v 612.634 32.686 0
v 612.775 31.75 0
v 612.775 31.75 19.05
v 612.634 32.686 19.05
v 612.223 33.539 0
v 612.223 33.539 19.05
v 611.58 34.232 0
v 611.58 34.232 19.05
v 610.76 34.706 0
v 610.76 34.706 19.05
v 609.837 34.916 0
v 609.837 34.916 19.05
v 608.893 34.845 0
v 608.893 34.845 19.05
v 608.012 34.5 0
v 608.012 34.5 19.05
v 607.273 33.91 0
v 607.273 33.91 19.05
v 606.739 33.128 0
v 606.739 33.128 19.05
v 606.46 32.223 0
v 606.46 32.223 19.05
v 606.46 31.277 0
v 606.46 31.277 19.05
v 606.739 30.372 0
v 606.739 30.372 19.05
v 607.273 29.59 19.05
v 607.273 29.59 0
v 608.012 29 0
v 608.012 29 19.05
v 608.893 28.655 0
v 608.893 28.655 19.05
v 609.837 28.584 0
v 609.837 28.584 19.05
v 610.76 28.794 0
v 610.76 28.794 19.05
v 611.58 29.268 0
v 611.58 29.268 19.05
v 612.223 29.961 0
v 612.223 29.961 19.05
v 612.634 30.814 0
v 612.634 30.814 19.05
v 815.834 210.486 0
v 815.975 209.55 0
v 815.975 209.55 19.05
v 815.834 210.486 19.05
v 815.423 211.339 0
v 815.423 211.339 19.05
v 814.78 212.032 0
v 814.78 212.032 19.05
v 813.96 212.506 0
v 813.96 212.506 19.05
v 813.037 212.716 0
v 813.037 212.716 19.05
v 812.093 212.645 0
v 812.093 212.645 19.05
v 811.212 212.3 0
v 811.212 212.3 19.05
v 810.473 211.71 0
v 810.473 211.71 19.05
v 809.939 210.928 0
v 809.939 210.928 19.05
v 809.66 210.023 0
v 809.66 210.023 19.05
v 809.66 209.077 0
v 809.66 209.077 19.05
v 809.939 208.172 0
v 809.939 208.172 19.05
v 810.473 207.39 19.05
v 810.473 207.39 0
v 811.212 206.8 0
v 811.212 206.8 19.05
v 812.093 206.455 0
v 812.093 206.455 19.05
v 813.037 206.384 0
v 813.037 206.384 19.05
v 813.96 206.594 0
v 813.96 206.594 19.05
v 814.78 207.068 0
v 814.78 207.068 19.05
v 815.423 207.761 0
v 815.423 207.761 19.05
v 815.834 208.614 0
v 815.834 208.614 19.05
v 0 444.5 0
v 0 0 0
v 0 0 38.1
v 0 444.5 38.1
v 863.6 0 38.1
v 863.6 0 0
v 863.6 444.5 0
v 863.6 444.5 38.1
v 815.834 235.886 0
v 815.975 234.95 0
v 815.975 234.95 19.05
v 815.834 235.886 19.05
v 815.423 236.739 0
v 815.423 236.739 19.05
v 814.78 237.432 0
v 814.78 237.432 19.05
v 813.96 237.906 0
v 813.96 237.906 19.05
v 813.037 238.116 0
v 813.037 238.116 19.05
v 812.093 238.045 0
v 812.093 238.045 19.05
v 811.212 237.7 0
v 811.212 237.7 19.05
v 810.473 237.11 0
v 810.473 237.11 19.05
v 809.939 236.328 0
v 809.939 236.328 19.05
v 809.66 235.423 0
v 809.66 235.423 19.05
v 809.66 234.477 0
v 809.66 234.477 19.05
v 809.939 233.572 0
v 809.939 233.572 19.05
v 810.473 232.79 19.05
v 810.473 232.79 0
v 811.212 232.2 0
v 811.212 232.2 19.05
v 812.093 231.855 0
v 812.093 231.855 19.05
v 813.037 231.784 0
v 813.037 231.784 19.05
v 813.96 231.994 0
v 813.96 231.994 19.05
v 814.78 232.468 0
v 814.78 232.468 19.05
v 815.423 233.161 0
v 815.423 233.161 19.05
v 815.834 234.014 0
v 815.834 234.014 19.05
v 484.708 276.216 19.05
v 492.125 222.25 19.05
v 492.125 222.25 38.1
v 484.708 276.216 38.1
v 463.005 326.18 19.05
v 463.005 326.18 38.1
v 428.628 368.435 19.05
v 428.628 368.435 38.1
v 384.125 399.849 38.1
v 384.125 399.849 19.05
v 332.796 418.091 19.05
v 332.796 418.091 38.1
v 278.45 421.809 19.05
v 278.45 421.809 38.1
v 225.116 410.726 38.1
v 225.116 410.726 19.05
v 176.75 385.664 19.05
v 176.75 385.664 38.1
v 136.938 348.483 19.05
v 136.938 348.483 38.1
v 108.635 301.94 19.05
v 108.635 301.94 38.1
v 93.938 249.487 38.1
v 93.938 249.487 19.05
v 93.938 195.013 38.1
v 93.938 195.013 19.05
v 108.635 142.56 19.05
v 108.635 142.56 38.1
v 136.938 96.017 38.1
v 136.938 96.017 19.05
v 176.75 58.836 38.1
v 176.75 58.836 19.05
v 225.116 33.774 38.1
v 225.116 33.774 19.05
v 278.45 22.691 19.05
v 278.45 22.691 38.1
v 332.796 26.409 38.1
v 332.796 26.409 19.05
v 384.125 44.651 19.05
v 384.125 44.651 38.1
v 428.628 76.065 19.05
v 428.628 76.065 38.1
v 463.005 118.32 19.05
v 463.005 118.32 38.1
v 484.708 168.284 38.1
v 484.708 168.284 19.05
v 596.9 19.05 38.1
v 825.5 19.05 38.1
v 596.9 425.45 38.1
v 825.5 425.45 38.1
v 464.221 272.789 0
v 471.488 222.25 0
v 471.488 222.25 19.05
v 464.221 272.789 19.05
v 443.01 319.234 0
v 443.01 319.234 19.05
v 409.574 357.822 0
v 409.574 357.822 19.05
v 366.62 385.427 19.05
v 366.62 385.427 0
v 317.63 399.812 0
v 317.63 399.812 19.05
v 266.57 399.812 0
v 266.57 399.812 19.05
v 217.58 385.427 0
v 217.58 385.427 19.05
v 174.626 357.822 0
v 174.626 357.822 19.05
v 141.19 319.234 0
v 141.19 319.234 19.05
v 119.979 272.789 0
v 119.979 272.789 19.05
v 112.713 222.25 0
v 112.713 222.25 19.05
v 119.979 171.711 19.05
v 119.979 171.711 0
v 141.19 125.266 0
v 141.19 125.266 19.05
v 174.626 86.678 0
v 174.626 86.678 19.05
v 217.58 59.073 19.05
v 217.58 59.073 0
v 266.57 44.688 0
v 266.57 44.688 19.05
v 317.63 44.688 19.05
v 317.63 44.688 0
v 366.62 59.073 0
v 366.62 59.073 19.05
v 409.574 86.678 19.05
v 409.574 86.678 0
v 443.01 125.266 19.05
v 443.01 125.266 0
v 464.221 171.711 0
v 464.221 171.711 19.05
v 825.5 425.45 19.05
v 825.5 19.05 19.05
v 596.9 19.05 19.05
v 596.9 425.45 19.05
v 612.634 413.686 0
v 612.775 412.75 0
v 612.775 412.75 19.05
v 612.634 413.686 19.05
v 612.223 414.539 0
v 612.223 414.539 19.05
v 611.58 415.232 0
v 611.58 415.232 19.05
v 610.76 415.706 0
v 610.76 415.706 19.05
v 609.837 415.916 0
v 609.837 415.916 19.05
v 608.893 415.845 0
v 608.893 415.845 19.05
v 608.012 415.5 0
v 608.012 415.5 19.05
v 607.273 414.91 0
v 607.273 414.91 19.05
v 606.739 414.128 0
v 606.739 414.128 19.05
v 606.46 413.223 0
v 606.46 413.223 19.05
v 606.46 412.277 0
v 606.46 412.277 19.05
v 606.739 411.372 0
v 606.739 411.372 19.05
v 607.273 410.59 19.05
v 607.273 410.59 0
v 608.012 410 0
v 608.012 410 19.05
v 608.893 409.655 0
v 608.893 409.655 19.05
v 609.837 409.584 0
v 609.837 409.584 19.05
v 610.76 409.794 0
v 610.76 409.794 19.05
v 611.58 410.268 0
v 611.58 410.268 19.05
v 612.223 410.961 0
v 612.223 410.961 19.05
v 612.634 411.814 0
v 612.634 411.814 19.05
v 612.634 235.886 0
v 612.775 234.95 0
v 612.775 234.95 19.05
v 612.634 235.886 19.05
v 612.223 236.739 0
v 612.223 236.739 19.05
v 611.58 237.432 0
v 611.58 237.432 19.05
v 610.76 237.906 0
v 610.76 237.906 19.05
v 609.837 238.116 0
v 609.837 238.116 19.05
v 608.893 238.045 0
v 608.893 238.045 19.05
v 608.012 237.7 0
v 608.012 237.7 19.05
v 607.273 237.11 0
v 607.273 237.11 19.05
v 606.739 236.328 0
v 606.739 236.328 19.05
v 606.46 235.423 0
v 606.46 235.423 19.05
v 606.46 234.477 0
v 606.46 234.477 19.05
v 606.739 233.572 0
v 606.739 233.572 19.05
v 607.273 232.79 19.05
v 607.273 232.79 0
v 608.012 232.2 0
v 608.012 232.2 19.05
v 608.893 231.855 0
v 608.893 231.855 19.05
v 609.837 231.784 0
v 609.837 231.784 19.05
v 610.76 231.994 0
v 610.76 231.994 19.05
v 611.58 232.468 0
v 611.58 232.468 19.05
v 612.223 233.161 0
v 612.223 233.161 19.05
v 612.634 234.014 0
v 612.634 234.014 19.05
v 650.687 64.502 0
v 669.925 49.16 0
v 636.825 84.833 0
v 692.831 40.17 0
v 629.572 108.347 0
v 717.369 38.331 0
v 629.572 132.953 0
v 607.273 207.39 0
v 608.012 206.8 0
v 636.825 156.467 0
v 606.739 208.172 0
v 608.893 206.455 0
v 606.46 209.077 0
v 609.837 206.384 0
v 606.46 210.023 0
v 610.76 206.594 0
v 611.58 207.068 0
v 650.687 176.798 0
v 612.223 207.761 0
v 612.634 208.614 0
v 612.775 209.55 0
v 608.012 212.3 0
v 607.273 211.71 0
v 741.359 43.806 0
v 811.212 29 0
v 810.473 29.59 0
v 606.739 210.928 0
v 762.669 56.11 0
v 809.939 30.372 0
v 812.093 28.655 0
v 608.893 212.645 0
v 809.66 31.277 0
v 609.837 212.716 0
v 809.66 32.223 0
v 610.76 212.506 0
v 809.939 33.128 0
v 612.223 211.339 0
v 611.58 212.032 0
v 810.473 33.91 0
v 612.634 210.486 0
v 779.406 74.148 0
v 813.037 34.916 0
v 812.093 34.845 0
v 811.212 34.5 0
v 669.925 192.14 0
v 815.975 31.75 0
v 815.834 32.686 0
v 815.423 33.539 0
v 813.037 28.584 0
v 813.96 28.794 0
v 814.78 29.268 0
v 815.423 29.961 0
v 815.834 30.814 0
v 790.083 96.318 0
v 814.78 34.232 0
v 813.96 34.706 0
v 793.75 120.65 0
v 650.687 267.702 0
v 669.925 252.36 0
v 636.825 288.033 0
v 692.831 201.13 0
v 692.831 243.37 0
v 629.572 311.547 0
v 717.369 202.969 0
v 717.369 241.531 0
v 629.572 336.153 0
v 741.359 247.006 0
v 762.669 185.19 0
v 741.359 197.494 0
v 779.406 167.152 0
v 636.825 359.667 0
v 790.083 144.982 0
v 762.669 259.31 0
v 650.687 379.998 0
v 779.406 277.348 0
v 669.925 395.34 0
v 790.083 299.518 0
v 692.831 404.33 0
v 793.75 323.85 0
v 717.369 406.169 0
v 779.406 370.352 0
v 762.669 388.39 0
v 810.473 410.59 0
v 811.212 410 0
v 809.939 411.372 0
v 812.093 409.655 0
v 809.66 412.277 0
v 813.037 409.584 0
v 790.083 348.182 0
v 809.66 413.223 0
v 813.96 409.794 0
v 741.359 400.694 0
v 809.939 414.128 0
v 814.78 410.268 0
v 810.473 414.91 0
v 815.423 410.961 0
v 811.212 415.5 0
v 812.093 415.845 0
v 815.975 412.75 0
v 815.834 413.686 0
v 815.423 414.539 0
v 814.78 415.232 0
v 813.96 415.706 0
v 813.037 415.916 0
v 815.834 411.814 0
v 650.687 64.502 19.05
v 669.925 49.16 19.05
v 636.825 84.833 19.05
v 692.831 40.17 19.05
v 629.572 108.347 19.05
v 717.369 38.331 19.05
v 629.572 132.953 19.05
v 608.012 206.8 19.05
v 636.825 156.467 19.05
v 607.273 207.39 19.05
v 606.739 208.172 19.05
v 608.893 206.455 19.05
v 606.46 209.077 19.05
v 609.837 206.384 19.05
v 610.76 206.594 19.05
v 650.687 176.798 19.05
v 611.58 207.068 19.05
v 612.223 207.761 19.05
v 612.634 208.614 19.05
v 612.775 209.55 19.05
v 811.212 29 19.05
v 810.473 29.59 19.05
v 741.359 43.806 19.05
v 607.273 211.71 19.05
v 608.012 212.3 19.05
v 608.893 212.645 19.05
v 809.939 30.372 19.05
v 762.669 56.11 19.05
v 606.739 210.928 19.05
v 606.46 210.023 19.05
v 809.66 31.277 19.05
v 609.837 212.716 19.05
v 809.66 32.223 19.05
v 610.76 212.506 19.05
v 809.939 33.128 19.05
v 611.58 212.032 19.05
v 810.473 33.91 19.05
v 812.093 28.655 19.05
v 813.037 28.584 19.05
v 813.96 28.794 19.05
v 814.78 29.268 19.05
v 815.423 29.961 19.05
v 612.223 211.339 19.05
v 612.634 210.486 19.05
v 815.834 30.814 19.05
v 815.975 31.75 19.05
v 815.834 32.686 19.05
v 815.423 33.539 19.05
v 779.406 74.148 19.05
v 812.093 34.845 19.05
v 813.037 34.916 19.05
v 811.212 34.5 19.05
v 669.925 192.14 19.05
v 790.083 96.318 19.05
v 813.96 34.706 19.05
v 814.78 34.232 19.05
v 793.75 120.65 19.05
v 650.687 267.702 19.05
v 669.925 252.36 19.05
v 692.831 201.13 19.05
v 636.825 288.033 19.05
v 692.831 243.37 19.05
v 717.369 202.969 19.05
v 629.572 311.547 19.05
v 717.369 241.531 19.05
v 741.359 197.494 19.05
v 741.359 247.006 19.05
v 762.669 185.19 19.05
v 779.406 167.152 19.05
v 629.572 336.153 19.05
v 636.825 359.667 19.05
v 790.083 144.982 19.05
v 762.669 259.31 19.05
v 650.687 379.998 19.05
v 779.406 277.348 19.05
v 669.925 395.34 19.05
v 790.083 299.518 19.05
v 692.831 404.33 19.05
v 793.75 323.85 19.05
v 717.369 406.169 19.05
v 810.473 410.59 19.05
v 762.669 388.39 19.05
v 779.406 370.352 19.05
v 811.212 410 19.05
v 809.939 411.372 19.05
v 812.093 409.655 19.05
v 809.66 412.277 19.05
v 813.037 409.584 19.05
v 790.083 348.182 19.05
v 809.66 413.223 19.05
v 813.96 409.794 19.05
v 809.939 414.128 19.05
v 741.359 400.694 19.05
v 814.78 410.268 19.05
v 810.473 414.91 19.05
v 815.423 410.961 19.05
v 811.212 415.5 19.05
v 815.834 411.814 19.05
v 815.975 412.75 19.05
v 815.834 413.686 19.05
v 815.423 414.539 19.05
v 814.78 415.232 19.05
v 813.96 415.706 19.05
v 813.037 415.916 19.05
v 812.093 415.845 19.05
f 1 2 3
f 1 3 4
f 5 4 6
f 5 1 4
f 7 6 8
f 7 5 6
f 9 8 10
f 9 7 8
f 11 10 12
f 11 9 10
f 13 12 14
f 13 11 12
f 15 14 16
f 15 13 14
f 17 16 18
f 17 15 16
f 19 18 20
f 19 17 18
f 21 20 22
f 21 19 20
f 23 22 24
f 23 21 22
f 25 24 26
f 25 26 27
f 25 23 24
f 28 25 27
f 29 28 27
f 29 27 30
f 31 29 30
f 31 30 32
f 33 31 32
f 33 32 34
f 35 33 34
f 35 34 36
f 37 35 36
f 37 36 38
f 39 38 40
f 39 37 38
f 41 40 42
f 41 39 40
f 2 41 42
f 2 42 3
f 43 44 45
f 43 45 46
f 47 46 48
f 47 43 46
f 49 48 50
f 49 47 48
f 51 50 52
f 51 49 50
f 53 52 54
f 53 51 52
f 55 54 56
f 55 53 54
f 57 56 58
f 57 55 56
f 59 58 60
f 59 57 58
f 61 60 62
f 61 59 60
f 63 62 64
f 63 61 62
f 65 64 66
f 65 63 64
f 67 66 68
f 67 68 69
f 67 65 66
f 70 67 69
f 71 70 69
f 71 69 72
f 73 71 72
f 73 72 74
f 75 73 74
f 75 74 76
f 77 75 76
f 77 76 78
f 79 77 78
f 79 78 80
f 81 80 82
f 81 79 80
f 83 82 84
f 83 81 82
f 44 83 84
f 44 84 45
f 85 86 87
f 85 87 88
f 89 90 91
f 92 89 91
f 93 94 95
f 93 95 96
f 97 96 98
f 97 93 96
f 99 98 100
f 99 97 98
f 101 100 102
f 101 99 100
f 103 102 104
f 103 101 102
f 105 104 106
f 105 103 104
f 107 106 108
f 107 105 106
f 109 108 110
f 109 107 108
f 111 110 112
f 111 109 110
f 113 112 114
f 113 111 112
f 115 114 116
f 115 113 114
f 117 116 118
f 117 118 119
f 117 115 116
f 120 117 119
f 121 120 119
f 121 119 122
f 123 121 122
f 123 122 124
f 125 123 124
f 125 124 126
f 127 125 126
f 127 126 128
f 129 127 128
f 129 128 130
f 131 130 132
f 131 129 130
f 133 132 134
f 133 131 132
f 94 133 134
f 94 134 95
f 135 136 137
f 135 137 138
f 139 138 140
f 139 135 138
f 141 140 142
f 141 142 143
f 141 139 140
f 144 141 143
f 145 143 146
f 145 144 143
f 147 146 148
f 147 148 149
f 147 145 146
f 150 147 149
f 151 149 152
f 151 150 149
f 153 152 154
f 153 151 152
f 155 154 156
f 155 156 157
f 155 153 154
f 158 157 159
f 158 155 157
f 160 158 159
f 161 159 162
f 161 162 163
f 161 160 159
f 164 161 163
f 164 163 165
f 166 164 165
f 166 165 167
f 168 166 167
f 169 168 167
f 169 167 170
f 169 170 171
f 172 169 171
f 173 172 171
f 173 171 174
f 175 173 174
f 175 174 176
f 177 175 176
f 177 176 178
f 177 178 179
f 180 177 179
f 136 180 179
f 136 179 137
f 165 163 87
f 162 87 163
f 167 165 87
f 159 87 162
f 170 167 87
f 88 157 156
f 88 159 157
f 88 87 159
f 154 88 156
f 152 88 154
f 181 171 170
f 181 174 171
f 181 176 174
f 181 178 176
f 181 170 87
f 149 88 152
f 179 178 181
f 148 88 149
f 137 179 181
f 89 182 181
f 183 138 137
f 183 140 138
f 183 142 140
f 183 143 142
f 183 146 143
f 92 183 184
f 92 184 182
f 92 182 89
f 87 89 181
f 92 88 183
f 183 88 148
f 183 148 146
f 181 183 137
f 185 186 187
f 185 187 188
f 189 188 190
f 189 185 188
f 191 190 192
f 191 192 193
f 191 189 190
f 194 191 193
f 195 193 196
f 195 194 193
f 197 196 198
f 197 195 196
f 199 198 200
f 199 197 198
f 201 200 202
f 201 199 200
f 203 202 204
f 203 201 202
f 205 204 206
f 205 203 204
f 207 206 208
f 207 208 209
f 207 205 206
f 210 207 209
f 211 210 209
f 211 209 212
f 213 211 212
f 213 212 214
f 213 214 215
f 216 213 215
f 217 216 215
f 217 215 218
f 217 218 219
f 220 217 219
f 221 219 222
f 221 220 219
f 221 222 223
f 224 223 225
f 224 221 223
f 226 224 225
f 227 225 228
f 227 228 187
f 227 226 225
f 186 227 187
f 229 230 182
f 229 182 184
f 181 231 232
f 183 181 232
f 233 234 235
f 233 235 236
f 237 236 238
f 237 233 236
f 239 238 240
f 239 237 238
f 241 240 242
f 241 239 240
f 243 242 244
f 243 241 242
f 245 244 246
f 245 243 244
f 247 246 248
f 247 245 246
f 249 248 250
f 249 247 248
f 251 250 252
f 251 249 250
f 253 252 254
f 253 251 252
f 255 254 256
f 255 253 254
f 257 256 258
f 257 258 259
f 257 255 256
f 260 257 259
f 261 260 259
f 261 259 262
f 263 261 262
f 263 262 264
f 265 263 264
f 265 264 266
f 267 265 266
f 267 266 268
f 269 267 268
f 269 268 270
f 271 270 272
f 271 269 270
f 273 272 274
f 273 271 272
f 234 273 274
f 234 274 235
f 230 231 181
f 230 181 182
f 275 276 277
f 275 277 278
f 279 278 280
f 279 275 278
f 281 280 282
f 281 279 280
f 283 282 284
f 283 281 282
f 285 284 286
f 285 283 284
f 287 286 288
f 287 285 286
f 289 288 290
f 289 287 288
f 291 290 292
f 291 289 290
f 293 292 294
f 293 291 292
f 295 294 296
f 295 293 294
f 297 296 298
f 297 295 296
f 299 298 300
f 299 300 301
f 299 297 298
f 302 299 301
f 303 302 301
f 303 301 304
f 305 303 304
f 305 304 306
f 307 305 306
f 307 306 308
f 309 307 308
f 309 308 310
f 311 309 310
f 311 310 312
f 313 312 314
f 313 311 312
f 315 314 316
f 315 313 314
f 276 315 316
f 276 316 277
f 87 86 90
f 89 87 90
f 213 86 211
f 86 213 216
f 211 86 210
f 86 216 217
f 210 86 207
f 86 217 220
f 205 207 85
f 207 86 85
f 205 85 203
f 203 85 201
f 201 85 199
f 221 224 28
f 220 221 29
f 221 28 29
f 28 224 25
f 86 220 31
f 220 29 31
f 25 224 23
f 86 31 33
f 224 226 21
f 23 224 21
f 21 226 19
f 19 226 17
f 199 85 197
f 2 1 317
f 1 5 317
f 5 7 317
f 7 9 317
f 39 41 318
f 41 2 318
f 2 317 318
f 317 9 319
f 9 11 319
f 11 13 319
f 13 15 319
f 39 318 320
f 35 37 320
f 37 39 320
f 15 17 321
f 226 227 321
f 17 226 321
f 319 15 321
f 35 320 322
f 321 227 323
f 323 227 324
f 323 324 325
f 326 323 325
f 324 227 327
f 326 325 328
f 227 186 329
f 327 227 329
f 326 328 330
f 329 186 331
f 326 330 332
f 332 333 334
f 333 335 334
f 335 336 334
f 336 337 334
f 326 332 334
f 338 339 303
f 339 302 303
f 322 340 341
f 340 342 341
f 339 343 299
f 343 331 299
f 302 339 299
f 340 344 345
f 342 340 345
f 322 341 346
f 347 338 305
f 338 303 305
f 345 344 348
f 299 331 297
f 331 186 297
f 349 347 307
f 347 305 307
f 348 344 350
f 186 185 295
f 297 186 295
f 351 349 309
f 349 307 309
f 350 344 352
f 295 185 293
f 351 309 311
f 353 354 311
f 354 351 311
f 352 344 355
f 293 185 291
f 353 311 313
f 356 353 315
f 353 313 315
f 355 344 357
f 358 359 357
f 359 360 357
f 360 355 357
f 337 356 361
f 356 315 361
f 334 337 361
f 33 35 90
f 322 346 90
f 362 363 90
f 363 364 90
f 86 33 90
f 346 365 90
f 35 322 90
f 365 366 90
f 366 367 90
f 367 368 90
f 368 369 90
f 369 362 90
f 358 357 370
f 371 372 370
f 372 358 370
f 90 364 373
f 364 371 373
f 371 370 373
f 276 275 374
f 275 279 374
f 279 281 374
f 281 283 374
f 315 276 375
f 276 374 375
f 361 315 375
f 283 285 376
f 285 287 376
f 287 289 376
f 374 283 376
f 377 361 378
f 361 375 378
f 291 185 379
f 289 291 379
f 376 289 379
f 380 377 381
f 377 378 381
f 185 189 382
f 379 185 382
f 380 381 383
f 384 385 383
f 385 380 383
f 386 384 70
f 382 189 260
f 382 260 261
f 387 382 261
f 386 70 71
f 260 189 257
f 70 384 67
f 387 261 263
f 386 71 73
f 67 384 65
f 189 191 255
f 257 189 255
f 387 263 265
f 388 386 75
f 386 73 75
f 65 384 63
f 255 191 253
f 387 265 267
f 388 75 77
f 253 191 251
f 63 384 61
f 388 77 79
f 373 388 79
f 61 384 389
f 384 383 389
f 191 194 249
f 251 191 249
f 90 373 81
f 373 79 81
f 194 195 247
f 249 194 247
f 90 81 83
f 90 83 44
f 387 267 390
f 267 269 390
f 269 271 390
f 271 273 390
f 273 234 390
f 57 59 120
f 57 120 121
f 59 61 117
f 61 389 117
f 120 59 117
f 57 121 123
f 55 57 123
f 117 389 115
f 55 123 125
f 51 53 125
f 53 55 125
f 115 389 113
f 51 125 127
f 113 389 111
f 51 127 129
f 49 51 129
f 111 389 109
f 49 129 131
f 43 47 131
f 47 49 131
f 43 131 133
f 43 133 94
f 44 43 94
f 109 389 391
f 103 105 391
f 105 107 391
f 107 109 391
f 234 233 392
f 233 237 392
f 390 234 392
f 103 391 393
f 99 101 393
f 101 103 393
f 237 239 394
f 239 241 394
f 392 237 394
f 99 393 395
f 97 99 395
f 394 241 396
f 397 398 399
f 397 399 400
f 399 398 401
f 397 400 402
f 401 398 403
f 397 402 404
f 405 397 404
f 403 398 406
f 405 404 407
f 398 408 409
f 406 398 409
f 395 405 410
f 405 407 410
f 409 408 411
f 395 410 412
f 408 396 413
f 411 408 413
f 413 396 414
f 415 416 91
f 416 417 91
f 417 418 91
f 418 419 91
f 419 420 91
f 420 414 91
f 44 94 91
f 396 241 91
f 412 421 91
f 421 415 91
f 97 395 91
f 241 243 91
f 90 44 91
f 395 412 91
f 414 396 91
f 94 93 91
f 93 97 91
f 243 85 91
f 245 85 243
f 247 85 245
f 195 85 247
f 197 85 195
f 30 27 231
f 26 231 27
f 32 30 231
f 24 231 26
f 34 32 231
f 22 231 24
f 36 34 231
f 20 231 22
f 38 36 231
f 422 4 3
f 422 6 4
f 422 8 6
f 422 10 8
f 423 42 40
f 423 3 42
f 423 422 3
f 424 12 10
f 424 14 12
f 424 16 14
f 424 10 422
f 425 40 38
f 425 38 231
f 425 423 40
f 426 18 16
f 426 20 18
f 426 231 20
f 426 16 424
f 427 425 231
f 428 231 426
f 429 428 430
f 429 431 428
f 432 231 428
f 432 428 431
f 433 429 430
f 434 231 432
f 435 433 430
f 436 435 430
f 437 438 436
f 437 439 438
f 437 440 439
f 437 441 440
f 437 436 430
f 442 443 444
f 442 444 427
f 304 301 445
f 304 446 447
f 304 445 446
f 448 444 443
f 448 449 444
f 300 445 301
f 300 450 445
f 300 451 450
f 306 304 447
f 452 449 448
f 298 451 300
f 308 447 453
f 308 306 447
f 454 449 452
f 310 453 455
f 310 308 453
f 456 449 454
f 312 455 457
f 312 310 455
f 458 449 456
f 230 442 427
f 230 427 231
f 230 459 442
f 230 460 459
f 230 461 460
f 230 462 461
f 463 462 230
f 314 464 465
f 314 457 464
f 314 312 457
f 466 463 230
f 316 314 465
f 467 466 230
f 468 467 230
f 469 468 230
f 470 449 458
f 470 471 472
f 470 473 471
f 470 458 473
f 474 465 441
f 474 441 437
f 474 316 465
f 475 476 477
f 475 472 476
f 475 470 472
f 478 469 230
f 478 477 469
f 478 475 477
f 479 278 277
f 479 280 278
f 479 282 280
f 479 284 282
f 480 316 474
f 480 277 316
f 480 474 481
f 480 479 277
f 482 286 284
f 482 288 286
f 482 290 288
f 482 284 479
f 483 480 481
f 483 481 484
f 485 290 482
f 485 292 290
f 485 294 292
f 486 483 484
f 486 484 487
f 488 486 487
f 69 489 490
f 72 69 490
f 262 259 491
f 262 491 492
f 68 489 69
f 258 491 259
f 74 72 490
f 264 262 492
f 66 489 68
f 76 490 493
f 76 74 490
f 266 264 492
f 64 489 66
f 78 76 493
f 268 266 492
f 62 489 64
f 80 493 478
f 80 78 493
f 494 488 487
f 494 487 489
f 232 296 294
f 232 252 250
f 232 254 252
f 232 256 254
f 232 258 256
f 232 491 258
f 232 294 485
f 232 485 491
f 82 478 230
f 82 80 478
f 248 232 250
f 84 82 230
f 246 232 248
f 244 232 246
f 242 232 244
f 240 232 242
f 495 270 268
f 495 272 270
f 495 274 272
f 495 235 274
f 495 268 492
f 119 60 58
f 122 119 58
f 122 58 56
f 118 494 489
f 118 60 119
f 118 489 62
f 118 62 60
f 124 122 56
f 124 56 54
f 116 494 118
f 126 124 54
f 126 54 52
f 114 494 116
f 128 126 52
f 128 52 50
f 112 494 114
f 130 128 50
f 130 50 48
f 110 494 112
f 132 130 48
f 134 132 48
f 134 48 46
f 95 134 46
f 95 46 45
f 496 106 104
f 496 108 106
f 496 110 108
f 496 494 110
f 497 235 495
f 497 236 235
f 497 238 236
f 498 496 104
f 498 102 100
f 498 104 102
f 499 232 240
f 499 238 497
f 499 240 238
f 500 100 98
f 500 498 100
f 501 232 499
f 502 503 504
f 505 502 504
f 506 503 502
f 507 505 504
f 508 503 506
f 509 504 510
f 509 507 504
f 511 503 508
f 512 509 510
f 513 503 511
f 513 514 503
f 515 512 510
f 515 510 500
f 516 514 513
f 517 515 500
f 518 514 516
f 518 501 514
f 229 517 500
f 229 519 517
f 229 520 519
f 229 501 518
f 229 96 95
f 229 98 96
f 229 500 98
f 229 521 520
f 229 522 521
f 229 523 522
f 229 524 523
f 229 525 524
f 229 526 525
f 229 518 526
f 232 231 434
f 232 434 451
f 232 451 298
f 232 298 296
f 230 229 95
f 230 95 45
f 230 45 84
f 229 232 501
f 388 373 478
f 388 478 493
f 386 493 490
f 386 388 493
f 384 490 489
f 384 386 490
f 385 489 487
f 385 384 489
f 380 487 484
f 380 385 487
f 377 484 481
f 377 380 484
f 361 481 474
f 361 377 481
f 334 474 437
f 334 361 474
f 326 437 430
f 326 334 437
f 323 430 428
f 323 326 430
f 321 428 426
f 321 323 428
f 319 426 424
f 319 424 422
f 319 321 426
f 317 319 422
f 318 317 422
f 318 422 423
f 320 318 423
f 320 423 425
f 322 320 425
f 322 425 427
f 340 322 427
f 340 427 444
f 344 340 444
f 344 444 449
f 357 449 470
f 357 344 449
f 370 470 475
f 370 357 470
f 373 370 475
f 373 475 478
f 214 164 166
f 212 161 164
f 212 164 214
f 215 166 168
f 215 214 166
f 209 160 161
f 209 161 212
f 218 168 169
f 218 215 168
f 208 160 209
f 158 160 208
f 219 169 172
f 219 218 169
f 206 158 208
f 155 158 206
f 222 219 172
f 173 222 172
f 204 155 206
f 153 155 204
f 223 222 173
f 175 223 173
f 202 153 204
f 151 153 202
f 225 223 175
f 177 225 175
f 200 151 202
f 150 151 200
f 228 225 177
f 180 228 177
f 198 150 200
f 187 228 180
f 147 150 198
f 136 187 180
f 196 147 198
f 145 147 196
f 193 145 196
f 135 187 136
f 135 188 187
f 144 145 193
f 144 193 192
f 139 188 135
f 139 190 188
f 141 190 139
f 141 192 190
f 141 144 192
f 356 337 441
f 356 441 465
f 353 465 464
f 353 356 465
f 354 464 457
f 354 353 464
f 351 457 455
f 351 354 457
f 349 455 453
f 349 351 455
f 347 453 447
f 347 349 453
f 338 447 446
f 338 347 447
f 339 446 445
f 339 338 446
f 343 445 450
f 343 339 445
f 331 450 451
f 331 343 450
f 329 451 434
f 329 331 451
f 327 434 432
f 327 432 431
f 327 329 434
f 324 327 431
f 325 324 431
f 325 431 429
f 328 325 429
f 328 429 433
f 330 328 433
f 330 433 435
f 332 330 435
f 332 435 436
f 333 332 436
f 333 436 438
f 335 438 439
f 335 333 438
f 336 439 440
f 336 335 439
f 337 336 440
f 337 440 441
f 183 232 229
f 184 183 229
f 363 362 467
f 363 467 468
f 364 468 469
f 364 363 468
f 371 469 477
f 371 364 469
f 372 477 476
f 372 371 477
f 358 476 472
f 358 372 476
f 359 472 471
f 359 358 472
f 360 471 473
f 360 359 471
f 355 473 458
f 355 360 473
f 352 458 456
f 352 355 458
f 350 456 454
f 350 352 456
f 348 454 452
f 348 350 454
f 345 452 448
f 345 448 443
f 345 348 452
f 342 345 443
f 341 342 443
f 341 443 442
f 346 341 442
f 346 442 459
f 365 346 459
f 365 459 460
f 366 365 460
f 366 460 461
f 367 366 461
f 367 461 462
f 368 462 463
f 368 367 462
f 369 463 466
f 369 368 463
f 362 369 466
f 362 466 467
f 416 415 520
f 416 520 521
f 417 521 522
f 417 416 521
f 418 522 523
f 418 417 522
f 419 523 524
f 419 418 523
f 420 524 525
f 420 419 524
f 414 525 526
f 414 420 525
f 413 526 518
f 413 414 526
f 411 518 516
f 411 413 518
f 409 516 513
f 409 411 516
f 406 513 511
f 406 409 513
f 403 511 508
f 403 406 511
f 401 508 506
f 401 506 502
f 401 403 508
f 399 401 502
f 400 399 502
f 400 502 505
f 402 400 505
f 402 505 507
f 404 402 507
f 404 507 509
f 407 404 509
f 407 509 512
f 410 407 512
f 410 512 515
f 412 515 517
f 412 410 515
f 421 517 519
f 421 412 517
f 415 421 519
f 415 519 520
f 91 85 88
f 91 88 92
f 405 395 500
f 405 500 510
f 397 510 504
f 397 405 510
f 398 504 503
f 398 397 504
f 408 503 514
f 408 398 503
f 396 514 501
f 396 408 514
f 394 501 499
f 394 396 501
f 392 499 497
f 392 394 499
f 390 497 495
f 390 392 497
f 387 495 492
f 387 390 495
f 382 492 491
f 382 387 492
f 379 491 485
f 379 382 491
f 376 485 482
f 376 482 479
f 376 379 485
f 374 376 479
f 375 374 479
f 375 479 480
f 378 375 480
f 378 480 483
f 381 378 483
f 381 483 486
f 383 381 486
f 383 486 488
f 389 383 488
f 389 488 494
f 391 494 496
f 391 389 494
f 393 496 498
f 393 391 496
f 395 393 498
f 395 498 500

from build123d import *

# Parameters (mm, degrees)
F0_W     = 863.6
F0_H     = 444.5
F0_R     = 200.025
F0_W_2   = 228.6
F0_H_2   = 406.4
F1_DEPTH = 38.1
F0_R_2   = 179.3875
F0_R_3   = 3.175
F0_R_4   = 82.55
F2_DEPTH = 19.05


with BuildPart() as f1:
    # F0 (on Top) → F1 (new body)
    with BuildSketch(Plane.XY):
        with Locations((431.8, 222.25)):
            Rectangle(F0_W, F0_H)
        with Locations((292.1, 222.25)):
            Circle(F0_R, mode=Mode.SUBTRACT)
        with Locations((711.2, 222.25)):
            Rectangle(F0_W_2, F0_H_2, mode=Mode.SUBTRACT)
    extrude(amount=F1_DEPTH)

    # F0 (on Top) → F2 (join)
    with BuildSketch(Plane.XY):
        with Locations((292.1, 222.25)):
            Circle(F0_R)
        with Locations((292.1, 222.25)):
            Circle(F0_R_2, mode=Mode.SUBTRACT)
        with Locations((711.2, 222.25)):
            Rectangle(F0_W_2, F0_H_2)
        with Locations((609.6, 31.75)):
            Circle(F0_R_3, mode=Mode.SUBTRACT)
        with Locations((812.8, 31.75)):
            Circle(F0_R_3, mode=Mode.SUBTRACT)
        with Locations((609.6, 209.55)):
            Circle(F0_R_3, mode=Mode.SUBTRACT)
        with Locations((711.2, 120.65)):
            Circle(F0_R_4, mode=Mode.SUBTRACT)
        with Locations((812.8, 209.55)):
            Circle(F0_R_3, mode=Mode.SUBTRACT)
        with Locations((609.6, 234.95)):
            Circle(F0_R_3, mode=Mode.SUBTRACT)
        with Locations((812.8, 234.95)):
            Circle(F0_R_3, mode=Mode.SUBTRACT)
        with Locations((711.2, 323.85)):
            Circle(F0_R_4, mode=Mode.SUBTRACT)
        with Locations((609.6, 412.75)):
            Circle(F0_R_3, mode=Mode.SUBTRACT)
        with Locations((812.8, 412.75)):
            Circle(F0_R_3, mode=Mode.SUBTRACT)
    extrude(amount=F2_DEPTH)


solid = f1.part
